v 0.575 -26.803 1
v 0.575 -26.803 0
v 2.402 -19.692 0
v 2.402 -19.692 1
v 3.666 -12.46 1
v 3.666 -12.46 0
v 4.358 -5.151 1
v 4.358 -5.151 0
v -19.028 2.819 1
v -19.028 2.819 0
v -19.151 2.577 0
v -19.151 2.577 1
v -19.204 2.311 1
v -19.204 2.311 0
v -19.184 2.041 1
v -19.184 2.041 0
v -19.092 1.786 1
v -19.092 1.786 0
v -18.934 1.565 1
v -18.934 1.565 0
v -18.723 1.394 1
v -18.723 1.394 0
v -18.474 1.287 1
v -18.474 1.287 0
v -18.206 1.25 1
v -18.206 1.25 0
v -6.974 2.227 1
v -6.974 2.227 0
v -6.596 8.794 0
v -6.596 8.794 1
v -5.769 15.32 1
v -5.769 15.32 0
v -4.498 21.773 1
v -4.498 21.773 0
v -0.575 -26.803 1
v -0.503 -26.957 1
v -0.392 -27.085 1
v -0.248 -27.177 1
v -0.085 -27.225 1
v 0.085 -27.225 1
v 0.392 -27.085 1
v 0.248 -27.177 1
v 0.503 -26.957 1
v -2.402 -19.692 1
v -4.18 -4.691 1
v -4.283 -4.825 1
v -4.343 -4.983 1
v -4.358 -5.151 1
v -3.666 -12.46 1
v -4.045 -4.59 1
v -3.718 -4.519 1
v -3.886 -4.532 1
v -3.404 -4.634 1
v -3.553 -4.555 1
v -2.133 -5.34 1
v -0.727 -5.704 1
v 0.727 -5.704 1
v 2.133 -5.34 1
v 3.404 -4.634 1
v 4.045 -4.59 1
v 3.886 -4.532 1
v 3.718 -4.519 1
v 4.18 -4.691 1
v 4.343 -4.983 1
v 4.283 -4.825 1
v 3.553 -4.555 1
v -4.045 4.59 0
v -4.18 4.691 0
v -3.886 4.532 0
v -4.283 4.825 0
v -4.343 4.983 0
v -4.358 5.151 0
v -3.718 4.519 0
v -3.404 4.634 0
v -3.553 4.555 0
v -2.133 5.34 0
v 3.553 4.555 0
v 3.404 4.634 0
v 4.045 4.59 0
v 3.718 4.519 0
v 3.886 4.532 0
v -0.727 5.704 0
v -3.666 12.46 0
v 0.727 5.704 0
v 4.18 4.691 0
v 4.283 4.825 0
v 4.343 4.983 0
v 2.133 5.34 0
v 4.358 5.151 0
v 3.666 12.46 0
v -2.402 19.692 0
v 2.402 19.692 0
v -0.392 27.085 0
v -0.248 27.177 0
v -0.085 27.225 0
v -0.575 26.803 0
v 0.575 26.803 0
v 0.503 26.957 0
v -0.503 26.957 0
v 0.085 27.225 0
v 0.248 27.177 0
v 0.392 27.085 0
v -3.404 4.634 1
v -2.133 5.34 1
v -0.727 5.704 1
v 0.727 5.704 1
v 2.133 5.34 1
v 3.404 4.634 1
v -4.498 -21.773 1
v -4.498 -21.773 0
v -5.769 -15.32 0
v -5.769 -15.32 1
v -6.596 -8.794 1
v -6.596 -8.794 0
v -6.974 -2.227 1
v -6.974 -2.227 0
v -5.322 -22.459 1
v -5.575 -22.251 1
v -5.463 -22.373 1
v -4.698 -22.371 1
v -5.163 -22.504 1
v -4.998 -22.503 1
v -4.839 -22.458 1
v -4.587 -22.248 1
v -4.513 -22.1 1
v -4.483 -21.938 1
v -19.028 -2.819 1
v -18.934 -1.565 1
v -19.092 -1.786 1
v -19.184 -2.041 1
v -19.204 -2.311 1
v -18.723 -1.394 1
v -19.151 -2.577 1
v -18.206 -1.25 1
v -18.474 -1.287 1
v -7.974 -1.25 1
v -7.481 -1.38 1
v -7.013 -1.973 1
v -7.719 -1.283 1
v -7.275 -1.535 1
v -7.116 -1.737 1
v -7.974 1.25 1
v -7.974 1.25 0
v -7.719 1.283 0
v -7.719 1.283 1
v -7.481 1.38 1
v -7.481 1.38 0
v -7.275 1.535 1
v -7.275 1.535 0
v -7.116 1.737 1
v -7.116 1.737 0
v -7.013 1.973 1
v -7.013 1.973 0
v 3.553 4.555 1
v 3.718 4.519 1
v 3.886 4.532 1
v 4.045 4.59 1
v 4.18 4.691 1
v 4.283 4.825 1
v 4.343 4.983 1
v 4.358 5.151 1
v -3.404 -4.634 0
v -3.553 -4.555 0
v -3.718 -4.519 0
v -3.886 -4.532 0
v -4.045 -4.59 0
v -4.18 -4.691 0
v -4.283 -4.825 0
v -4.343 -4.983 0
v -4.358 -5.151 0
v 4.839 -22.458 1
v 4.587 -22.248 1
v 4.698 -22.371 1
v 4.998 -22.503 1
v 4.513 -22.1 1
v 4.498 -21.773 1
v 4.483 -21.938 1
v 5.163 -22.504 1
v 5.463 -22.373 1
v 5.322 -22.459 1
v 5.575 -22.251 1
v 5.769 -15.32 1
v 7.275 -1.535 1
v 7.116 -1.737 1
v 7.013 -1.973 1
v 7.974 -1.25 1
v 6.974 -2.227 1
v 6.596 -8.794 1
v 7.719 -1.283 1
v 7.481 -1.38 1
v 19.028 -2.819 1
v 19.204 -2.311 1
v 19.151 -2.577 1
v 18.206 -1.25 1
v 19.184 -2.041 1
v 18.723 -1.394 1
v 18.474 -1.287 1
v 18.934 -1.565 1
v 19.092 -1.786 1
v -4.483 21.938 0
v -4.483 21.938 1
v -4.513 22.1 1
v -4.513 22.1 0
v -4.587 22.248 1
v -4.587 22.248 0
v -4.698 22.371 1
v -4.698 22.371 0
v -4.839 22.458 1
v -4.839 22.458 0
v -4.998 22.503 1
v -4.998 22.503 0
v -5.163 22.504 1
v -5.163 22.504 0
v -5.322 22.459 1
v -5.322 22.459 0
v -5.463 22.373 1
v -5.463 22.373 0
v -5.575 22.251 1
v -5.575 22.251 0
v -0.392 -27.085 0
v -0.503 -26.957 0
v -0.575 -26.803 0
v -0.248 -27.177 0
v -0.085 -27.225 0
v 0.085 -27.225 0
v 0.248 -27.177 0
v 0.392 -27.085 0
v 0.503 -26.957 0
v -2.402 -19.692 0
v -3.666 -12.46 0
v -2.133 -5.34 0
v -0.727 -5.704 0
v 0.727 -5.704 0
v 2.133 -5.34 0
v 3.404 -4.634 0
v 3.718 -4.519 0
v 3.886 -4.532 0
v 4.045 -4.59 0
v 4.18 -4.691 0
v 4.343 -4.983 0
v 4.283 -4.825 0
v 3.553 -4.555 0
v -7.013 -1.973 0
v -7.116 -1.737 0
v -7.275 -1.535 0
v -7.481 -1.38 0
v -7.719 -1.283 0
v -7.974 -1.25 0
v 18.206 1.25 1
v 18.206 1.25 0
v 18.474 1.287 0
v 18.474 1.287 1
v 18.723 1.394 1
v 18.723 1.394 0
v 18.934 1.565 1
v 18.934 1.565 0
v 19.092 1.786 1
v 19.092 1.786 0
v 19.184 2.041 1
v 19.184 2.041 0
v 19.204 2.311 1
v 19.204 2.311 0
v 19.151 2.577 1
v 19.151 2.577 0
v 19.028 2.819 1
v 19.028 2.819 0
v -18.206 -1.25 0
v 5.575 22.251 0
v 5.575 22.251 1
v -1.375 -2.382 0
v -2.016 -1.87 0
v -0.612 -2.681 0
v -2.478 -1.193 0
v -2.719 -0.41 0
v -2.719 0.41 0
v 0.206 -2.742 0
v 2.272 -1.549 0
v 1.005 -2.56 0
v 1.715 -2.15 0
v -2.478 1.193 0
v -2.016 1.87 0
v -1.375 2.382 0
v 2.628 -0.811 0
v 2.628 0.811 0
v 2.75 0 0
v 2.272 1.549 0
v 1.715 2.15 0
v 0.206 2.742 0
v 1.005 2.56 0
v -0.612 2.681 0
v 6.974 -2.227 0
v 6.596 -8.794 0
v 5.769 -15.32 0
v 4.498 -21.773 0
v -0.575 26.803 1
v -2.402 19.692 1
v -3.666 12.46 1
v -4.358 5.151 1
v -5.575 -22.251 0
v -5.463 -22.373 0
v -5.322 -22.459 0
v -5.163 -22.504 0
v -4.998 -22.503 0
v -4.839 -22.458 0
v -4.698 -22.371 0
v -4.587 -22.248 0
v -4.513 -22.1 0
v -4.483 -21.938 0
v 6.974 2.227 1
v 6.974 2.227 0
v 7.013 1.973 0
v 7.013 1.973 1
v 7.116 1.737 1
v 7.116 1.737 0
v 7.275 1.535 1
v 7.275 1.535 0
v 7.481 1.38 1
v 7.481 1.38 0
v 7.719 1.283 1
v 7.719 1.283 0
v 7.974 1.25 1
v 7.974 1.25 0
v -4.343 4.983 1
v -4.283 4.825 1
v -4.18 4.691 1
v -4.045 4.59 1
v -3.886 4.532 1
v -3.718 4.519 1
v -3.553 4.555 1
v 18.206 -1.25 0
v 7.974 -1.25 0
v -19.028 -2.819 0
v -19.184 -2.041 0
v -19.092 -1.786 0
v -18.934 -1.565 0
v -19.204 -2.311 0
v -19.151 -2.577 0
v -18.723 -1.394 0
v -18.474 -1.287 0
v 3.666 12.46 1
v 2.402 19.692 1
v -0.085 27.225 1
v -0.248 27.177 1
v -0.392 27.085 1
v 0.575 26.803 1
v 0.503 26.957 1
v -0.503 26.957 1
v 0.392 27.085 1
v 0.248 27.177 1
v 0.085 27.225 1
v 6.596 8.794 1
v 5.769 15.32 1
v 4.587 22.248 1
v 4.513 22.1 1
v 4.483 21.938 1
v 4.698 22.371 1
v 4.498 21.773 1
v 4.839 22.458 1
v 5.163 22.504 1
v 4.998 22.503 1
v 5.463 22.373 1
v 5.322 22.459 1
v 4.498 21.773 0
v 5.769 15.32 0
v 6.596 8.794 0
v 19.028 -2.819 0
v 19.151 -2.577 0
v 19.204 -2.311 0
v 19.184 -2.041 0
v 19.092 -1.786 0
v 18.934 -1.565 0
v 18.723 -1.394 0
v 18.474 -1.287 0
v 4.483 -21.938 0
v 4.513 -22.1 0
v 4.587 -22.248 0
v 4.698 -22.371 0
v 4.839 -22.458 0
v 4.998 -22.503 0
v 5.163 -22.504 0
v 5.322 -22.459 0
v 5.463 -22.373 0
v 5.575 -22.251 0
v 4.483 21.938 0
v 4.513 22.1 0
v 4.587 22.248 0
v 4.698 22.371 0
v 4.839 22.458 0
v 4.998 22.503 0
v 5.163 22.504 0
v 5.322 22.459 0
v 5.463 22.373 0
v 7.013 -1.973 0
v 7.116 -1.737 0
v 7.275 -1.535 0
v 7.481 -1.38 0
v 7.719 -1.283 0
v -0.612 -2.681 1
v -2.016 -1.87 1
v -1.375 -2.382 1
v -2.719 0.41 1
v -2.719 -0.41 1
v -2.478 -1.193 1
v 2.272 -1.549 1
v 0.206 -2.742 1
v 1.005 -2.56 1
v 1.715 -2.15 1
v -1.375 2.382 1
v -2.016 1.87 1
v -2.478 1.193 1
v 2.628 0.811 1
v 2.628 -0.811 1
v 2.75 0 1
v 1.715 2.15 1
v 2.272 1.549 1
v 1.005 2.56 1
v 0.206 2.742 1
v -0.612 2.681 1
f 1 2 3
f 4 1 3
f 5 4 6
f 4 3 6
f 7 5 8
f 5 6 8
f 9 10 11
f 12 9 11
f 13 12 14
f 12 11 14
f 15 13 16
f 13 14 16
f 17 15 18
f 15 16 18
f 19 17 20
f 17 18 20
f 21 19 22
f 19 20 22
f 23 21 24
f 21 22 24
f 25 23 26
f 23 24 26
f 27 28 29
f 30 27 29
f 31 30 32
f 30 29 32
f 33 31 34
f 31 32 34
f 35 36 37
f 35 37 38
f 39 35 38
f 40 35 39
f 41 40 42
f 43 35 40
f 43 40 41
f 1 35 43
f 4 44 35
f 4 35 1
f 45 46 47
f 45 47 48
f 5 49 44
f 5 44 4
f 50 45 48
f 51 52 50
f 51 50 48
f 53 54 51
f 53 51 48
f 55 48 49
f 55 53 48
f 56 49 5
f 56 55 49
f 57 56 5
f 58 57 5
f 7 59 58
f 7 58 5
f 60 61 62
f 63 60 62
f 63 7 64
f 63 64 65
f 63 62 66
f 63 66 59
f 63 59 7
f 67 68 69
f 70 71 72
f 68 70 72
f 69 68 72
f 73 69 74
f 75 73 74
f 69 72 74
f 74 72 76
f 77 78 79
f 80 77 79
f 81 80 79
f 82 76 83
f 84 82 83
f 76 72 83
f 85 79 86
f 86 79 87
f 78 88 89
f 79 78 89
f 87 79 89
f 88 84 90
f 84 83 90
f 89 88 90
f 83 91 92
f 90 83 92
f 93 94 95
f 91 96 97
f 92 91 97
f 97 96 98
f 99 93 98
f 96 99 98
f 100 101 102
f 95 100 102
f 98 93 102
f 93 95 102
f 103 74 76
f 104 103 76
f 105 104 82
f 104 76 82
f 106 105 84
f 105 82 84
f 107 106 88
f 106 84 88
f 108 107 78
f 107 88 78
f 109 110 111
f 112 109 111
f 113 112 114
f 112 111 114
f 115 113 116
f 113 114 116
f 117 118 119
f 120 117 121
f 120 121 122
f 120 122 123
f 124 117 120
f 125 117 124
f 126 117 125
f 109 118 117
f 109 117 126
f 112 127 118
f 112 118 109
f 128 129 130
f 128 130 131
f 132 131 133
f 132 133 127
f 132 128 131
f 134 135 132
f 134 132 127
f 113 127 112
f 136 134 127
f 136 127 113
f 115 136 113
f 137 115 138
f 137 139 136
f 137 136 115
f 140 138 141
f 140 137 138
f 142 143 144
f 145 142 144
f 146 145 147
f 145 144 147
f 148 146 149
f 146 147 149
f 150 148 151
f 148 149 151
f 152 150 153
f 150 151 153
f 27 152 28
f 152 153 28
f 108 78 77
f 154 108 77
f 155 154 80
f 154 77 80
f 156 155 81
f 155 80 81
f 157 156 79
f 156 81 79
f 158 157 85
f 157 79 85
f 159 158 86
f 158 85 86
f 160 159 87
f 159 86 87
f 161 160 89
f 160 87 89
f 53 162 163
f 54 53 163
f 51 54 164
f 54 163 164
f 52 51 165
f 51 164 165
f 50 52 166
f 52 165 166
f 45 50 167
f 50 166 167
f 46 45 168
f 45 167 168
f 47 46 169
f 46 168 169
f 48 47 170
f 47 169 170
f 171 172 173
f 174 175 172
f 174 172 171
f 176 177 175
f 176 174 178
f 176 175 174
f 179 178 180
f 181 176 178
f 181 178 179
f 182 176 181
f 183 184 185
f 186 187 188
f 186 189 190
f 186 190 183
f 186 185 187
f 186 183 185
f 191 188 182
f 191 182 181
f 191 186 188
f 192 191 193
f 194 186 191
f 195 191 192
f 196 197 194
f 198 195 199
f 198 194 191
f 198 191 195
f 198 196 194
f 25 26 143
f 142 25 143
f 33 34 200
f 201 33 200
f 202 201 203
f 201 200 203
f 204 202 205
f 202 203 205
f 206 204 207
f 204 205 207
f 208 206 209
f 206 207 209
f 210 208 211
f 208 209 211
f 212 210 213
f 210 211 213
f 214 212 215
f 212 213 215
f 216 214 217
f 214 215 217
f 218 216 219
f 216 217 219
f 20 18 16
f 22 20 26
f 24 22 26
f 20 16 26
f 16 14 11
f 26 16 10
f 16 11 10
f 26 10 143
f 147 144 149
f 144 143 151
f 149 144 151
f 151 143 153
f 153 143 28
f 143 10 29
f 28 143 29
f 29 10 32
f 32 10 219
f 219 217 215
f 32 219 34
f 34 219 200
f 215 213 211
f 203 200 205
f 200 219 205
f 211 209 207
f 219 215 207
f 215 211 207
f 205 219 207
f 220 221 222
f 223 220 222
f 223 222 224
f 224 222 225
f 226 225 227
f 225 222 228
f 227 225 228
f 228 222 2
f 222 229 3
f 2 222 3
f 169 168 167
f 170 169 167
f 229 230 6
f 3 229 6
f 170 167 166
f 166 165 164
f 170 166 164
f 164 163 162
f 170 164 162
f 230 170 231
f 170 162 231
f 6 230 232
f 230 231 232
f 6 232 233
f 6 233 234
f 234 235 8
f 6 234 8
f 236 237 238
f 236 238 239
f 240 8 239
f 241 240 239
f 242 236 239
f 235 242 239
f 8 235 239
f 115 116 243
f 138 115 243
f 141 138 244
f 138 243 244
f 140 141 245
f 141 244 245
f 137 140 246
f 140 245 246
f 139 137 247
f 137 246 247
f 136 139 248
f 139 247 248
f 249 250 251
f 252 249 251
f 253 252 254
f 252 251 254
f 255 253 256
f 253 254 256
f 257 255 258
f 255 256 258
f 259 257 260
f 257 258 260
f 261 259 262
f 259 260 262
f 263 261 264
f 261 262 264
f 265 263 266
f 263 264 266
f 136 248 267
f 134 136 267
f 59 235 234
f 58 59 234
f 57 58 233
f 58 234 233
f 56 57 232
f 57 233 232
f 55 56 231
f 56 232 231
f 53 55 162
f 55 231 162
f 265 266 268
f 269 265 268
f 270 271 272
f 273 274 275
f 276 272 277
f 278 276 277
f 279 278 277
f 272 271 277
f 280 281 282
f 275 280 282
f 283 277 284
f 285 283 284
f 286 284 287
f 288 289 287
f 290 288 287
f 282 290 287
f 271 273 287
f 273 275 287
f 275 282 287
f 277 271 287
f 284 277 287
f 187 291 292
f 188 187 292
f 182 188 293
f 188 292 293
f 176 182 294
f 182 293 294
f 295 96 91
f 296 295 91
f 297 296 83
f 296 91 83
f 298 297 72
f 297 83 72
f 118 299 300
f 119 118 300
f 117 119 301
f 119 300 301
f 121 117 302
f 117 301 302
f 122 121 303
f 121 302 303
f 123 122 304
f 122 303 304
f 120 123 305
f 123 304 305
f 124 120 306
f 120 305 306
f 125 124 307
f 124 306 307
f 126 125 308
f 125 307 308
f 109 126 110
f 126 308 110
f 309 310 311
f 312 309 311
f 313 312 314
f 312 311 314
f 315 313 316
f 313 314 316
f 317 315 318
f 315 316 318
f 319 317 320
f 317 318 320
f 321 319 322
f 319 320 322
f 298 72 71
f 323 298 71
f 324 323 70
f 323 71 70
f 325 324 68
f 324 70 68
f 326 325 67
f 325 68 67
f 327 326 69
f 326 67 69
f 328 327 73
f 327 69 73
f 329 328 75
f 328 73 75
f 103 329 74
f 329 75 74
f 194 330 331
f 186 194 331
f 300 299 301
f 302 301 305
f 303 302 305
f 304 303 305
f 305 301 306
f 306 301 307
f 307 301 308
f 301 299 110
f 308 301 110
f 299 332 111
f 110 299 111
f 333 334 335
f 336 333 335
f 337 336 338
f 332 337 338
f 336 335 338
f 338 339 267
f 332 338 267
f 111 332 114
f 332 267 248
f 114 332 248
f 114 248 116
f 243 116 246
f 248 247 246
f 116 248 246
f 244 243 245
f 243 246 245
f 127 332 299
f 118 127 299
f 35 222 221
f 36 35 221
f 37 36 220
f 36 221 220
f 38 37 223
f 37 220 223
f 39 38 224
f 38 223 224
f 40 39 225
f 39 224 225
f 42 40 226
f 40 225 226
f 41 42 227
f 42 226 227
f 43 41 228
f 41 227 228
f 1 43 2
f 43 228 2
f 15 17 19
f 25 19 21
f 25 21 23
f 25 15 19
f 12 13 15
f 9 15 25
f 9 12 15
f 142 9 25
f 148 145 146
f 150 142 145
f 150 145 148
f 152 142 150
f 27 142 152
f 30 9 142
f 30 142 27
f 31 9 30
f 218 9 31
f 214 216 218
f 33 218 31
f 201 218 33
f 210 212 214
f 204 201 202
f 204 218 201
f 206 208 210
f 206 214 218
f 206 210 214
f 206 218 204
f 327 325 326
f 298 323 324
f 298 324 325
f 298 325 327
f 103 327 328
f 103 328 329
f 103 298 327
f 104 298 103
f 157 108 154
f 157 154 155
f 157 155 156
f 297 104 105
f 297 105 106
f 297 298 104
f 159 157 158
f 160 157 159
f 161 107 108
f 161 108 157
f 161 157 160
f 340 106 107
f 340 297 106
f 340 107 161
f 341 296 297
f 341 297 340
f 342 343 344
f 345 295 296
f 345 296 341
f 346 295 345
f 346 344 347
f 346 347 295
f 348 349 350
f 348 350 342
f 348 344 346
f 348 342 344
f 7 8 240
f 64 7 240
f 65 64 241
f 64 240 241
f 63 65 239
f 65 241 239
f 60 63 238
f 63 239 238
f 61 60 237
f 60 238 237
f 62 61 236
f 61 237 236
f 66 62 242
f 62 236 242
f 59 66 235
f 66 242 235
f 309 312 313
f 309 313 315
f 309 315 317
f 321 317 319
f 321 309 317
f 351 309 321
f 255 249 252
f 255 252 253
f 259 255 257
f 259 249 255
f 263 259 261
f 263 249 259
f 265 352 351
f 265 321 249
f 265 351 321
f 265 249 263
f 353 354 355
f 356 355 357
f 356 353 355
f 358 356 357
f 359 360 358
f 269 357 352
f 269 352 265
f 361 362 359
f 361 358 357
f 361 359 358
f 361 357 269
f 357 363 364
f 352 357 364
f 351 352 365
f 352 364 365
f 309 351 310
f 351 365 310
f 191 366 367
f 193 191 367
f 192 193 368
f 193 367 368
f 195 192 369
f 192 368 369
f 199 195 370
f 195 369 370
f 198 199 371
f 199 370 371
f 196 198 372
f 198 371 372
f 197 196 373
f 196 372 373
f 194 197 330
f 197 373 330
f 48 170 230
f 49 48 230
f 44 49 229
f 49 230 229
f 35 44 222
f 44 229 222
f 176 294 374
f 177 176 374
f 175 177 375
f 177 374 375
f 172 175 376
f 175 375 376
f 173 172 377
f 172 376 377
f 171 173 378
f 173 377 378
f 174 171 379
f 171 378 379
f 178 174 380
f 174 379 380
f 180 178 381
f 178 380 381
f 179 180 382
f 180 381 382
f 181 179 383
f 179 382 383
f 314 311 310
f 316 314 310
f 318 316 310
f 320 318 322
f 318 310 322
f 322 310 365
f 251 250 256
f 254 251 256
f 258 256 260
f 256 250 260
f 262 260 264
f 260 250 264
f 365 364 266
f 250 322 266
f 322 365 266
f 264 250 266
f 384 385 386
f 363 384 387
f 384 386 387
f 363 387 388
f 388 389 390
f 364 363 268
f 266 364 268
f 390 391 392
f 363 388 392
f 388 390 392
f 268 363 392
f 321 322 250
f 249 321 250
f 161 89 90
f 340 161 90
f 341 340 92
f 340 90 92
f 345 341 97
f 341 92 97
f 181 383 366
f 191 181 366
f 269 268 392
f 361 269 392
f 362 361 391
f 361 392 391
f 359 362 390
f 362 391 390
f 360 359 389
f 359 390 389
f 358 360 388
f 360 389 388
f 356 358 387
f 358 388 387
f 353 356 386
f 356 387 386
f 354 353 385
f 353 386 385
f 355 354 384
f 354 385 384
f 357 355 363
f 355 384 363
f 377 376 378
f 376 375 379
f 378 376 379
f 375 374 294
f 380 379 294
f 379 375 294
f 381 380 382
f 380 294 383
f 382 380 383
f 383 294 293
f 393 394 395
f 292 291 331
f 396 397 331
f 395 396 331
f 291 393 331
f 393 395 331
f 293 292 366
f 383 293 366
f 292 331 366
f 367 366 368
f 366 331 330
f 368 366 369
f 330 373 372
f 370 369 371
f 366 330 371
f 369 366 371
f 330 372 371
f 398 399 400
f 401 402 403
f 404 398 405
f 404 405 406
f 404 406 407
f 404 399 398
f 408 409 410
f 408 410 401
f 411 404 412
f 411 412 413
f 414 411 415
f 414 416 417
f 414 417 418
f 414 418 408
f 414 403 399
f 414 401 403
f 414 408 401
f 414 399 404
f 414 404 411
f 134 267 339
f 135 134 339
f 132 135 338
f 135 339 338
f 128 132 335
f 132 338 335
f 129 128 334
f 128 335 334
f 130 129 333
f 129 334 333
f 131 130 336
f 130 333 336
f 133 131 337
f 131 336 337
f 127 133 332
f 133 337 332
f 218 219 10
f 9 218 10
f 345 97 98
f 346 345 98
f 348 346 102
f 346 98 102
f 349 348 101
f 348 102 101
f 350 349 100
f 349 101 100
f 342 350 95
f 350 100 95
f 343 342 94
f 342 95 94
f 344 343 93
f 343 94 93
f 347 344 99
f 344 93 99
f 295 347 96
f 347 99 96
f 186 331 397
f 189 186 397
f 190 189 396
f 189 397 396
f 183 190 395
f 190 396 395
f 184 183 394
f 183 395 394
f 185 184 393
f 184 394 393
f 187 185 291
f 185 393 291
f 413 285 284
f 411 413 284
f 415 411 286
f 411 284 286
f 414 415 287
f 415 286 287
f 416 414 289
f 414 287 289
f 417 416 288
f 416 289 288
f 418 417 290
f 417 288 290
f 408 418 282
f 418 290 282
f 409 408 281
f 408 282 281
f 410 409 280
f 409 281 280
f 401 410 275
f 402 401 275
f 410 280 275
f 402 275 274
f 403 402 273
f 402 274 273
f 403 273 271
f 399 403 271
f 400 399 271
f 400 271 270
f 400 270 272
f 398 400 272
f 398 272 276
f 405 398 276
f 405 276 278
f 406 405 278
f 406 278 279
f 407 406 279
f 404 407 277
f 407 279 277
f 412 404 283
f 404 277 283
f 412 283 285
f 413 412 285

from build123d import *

# Parameters (mm, degrees)
F0_R     = 2.75
F1_DEPTH = 1


with BuildPart() as f1:
    # F0 (on Top) → F1 (new body)
    with BuildSketch(Plane.XY):
        with BuildLine():
            Line((-5.575209, 22.250894), (-19.027913, 2.81921))
            ThreePointArc((-19.027913, 2.81921), (-19.091501, 1.785893), (-18.205721, 1.25))
            Line((-18.205721, 1.25), (-7.973894, 1.25))
            ThreePointArc((-7.973894, 1.25), (-7.275038, 1.534737), (-6.974163, 2.226798))
            ThreePointArc((-6.974163, 2.226798), (-6.238777, 12.063745), (-4.497539, 21.773247))
            ThreePointArc((-4.497539, 21.773247), (-4.838771, 22.457904), (-5.575209, 22.250894))
        make_face()
        Circle(F0_R)
        with BuildLine():
            ThreePointArc((0.574804, 26.802819), (0, 27.230772), (-0.574804, 26.802819))
            ThreePointArc((-0.574804, 26.802819), (-3.105018, 16.088501), (-4.357964, 5.151009))
            ThreePointArc((-4.357964, 5.151009), (-4.044543, 4.590314), (-3.403706, 4.634359))
            ThreePointArc((-3.403706, 4.634359), (0, 5.75), (3.403706, 4.634359))
            ThreePointArc((3.403706, 4.634359), (4.044543, 4.590314), (4.357964, 5.151009))
            ThreePointArc((4.357964, 5.151009), (3.105018, 16.088501), (0.574804, 26.802819))
        make_face()
        with BuildLine():
            ThreePointArc((5.575209, 22.250894), (4.838771, 22.457904), (4.497539, 21.773247))
            ThreePointArc((4.497539, 21.773247), (6.238777, 12.063745), (6.974163, 2.226798))
            ThreePointArc((6.974163, 2.226798), (7.275038, 1.534737), (7.973894, 1.25))
            Line((7.973894, 1.25), (18.205721, 1.25))
            ThreePointArc((18.205721, 1.25), (19.091501, 1.785893), (19.027913, 2.81921))
            Line((19.027913, 2.81921), (5.575209, 22.250894))
        make_face()
        with BuildLine():
            Line((-7.973894, -1.25), (-18.205721, -1.25))
            ThreePointArc((-18.205721, -1.25), (-19.091501, -1.785893), (-19.027913, -2.81921))
            Line((-19.027913, -2.81921), (-5.575209, -22.250894))
            ThreePointArc((-5.575209, -22.250894), (-4.838771, -22.457904), (-4.497539, -21.773247))
            ThreePointArc((-4.497539, -21.773247), (-6.238777, -12.063745), (-6.974163, -2.226798))
            ThreePointArc((-6.974163, -2.226798), (-7.275038, -1.534737), (-7.973894, -1.25))
        make_face()
        with BuildLine():
            ThreePointArc((-4.357964, -5.151009), (-3.105018, -16.088501), (-0.574804, -26.802819))
            ThreePointArc((-0.574804, -26.802819), (0, -27.230772), (0.574804, -26.802819))
            ThreePointArc((0.574804, -26.802819), (3.105018, -16.088501), (4.357964, -5.151009))
            ThreePointArc((4.357964, -5.151009), (4.044543, -4.590314), (3.403706, -4.634359))
            ThreePointArc((3.403706, -4.634359), (0, -5.75), (-3.403706, -4.634359))
            ThreePointArc((-3.403706, -4.634359), (-4.044543, -4.590314), (-4.357964, -5.151009))
        make_face()
        with BuildLine():
            ThreePointArc((6.974163, -2.226798), (6.238777, -12.063745), (4.497539, -21.773247))
            ThreePointArc((4.497539, -21.773247), (4.838771, -22.457904), (5.575209, -22.250894))
            Line((5.575209, -22.250894), (19.027913, -2.81921))
            ThreePointArc((19.027913, -2.81921), (19.091501, -1.785893), (18.205721, -1.25))
            Line((18.205721, -1.25), (7.973894, -1.25))
            ThreePointArc((7.973894, -1.25), (7.275038, -1.534737), (6.974163, -2.226798))
        make_face()
    extrude(amount=F1_DEPTH)


solid = f1.part
